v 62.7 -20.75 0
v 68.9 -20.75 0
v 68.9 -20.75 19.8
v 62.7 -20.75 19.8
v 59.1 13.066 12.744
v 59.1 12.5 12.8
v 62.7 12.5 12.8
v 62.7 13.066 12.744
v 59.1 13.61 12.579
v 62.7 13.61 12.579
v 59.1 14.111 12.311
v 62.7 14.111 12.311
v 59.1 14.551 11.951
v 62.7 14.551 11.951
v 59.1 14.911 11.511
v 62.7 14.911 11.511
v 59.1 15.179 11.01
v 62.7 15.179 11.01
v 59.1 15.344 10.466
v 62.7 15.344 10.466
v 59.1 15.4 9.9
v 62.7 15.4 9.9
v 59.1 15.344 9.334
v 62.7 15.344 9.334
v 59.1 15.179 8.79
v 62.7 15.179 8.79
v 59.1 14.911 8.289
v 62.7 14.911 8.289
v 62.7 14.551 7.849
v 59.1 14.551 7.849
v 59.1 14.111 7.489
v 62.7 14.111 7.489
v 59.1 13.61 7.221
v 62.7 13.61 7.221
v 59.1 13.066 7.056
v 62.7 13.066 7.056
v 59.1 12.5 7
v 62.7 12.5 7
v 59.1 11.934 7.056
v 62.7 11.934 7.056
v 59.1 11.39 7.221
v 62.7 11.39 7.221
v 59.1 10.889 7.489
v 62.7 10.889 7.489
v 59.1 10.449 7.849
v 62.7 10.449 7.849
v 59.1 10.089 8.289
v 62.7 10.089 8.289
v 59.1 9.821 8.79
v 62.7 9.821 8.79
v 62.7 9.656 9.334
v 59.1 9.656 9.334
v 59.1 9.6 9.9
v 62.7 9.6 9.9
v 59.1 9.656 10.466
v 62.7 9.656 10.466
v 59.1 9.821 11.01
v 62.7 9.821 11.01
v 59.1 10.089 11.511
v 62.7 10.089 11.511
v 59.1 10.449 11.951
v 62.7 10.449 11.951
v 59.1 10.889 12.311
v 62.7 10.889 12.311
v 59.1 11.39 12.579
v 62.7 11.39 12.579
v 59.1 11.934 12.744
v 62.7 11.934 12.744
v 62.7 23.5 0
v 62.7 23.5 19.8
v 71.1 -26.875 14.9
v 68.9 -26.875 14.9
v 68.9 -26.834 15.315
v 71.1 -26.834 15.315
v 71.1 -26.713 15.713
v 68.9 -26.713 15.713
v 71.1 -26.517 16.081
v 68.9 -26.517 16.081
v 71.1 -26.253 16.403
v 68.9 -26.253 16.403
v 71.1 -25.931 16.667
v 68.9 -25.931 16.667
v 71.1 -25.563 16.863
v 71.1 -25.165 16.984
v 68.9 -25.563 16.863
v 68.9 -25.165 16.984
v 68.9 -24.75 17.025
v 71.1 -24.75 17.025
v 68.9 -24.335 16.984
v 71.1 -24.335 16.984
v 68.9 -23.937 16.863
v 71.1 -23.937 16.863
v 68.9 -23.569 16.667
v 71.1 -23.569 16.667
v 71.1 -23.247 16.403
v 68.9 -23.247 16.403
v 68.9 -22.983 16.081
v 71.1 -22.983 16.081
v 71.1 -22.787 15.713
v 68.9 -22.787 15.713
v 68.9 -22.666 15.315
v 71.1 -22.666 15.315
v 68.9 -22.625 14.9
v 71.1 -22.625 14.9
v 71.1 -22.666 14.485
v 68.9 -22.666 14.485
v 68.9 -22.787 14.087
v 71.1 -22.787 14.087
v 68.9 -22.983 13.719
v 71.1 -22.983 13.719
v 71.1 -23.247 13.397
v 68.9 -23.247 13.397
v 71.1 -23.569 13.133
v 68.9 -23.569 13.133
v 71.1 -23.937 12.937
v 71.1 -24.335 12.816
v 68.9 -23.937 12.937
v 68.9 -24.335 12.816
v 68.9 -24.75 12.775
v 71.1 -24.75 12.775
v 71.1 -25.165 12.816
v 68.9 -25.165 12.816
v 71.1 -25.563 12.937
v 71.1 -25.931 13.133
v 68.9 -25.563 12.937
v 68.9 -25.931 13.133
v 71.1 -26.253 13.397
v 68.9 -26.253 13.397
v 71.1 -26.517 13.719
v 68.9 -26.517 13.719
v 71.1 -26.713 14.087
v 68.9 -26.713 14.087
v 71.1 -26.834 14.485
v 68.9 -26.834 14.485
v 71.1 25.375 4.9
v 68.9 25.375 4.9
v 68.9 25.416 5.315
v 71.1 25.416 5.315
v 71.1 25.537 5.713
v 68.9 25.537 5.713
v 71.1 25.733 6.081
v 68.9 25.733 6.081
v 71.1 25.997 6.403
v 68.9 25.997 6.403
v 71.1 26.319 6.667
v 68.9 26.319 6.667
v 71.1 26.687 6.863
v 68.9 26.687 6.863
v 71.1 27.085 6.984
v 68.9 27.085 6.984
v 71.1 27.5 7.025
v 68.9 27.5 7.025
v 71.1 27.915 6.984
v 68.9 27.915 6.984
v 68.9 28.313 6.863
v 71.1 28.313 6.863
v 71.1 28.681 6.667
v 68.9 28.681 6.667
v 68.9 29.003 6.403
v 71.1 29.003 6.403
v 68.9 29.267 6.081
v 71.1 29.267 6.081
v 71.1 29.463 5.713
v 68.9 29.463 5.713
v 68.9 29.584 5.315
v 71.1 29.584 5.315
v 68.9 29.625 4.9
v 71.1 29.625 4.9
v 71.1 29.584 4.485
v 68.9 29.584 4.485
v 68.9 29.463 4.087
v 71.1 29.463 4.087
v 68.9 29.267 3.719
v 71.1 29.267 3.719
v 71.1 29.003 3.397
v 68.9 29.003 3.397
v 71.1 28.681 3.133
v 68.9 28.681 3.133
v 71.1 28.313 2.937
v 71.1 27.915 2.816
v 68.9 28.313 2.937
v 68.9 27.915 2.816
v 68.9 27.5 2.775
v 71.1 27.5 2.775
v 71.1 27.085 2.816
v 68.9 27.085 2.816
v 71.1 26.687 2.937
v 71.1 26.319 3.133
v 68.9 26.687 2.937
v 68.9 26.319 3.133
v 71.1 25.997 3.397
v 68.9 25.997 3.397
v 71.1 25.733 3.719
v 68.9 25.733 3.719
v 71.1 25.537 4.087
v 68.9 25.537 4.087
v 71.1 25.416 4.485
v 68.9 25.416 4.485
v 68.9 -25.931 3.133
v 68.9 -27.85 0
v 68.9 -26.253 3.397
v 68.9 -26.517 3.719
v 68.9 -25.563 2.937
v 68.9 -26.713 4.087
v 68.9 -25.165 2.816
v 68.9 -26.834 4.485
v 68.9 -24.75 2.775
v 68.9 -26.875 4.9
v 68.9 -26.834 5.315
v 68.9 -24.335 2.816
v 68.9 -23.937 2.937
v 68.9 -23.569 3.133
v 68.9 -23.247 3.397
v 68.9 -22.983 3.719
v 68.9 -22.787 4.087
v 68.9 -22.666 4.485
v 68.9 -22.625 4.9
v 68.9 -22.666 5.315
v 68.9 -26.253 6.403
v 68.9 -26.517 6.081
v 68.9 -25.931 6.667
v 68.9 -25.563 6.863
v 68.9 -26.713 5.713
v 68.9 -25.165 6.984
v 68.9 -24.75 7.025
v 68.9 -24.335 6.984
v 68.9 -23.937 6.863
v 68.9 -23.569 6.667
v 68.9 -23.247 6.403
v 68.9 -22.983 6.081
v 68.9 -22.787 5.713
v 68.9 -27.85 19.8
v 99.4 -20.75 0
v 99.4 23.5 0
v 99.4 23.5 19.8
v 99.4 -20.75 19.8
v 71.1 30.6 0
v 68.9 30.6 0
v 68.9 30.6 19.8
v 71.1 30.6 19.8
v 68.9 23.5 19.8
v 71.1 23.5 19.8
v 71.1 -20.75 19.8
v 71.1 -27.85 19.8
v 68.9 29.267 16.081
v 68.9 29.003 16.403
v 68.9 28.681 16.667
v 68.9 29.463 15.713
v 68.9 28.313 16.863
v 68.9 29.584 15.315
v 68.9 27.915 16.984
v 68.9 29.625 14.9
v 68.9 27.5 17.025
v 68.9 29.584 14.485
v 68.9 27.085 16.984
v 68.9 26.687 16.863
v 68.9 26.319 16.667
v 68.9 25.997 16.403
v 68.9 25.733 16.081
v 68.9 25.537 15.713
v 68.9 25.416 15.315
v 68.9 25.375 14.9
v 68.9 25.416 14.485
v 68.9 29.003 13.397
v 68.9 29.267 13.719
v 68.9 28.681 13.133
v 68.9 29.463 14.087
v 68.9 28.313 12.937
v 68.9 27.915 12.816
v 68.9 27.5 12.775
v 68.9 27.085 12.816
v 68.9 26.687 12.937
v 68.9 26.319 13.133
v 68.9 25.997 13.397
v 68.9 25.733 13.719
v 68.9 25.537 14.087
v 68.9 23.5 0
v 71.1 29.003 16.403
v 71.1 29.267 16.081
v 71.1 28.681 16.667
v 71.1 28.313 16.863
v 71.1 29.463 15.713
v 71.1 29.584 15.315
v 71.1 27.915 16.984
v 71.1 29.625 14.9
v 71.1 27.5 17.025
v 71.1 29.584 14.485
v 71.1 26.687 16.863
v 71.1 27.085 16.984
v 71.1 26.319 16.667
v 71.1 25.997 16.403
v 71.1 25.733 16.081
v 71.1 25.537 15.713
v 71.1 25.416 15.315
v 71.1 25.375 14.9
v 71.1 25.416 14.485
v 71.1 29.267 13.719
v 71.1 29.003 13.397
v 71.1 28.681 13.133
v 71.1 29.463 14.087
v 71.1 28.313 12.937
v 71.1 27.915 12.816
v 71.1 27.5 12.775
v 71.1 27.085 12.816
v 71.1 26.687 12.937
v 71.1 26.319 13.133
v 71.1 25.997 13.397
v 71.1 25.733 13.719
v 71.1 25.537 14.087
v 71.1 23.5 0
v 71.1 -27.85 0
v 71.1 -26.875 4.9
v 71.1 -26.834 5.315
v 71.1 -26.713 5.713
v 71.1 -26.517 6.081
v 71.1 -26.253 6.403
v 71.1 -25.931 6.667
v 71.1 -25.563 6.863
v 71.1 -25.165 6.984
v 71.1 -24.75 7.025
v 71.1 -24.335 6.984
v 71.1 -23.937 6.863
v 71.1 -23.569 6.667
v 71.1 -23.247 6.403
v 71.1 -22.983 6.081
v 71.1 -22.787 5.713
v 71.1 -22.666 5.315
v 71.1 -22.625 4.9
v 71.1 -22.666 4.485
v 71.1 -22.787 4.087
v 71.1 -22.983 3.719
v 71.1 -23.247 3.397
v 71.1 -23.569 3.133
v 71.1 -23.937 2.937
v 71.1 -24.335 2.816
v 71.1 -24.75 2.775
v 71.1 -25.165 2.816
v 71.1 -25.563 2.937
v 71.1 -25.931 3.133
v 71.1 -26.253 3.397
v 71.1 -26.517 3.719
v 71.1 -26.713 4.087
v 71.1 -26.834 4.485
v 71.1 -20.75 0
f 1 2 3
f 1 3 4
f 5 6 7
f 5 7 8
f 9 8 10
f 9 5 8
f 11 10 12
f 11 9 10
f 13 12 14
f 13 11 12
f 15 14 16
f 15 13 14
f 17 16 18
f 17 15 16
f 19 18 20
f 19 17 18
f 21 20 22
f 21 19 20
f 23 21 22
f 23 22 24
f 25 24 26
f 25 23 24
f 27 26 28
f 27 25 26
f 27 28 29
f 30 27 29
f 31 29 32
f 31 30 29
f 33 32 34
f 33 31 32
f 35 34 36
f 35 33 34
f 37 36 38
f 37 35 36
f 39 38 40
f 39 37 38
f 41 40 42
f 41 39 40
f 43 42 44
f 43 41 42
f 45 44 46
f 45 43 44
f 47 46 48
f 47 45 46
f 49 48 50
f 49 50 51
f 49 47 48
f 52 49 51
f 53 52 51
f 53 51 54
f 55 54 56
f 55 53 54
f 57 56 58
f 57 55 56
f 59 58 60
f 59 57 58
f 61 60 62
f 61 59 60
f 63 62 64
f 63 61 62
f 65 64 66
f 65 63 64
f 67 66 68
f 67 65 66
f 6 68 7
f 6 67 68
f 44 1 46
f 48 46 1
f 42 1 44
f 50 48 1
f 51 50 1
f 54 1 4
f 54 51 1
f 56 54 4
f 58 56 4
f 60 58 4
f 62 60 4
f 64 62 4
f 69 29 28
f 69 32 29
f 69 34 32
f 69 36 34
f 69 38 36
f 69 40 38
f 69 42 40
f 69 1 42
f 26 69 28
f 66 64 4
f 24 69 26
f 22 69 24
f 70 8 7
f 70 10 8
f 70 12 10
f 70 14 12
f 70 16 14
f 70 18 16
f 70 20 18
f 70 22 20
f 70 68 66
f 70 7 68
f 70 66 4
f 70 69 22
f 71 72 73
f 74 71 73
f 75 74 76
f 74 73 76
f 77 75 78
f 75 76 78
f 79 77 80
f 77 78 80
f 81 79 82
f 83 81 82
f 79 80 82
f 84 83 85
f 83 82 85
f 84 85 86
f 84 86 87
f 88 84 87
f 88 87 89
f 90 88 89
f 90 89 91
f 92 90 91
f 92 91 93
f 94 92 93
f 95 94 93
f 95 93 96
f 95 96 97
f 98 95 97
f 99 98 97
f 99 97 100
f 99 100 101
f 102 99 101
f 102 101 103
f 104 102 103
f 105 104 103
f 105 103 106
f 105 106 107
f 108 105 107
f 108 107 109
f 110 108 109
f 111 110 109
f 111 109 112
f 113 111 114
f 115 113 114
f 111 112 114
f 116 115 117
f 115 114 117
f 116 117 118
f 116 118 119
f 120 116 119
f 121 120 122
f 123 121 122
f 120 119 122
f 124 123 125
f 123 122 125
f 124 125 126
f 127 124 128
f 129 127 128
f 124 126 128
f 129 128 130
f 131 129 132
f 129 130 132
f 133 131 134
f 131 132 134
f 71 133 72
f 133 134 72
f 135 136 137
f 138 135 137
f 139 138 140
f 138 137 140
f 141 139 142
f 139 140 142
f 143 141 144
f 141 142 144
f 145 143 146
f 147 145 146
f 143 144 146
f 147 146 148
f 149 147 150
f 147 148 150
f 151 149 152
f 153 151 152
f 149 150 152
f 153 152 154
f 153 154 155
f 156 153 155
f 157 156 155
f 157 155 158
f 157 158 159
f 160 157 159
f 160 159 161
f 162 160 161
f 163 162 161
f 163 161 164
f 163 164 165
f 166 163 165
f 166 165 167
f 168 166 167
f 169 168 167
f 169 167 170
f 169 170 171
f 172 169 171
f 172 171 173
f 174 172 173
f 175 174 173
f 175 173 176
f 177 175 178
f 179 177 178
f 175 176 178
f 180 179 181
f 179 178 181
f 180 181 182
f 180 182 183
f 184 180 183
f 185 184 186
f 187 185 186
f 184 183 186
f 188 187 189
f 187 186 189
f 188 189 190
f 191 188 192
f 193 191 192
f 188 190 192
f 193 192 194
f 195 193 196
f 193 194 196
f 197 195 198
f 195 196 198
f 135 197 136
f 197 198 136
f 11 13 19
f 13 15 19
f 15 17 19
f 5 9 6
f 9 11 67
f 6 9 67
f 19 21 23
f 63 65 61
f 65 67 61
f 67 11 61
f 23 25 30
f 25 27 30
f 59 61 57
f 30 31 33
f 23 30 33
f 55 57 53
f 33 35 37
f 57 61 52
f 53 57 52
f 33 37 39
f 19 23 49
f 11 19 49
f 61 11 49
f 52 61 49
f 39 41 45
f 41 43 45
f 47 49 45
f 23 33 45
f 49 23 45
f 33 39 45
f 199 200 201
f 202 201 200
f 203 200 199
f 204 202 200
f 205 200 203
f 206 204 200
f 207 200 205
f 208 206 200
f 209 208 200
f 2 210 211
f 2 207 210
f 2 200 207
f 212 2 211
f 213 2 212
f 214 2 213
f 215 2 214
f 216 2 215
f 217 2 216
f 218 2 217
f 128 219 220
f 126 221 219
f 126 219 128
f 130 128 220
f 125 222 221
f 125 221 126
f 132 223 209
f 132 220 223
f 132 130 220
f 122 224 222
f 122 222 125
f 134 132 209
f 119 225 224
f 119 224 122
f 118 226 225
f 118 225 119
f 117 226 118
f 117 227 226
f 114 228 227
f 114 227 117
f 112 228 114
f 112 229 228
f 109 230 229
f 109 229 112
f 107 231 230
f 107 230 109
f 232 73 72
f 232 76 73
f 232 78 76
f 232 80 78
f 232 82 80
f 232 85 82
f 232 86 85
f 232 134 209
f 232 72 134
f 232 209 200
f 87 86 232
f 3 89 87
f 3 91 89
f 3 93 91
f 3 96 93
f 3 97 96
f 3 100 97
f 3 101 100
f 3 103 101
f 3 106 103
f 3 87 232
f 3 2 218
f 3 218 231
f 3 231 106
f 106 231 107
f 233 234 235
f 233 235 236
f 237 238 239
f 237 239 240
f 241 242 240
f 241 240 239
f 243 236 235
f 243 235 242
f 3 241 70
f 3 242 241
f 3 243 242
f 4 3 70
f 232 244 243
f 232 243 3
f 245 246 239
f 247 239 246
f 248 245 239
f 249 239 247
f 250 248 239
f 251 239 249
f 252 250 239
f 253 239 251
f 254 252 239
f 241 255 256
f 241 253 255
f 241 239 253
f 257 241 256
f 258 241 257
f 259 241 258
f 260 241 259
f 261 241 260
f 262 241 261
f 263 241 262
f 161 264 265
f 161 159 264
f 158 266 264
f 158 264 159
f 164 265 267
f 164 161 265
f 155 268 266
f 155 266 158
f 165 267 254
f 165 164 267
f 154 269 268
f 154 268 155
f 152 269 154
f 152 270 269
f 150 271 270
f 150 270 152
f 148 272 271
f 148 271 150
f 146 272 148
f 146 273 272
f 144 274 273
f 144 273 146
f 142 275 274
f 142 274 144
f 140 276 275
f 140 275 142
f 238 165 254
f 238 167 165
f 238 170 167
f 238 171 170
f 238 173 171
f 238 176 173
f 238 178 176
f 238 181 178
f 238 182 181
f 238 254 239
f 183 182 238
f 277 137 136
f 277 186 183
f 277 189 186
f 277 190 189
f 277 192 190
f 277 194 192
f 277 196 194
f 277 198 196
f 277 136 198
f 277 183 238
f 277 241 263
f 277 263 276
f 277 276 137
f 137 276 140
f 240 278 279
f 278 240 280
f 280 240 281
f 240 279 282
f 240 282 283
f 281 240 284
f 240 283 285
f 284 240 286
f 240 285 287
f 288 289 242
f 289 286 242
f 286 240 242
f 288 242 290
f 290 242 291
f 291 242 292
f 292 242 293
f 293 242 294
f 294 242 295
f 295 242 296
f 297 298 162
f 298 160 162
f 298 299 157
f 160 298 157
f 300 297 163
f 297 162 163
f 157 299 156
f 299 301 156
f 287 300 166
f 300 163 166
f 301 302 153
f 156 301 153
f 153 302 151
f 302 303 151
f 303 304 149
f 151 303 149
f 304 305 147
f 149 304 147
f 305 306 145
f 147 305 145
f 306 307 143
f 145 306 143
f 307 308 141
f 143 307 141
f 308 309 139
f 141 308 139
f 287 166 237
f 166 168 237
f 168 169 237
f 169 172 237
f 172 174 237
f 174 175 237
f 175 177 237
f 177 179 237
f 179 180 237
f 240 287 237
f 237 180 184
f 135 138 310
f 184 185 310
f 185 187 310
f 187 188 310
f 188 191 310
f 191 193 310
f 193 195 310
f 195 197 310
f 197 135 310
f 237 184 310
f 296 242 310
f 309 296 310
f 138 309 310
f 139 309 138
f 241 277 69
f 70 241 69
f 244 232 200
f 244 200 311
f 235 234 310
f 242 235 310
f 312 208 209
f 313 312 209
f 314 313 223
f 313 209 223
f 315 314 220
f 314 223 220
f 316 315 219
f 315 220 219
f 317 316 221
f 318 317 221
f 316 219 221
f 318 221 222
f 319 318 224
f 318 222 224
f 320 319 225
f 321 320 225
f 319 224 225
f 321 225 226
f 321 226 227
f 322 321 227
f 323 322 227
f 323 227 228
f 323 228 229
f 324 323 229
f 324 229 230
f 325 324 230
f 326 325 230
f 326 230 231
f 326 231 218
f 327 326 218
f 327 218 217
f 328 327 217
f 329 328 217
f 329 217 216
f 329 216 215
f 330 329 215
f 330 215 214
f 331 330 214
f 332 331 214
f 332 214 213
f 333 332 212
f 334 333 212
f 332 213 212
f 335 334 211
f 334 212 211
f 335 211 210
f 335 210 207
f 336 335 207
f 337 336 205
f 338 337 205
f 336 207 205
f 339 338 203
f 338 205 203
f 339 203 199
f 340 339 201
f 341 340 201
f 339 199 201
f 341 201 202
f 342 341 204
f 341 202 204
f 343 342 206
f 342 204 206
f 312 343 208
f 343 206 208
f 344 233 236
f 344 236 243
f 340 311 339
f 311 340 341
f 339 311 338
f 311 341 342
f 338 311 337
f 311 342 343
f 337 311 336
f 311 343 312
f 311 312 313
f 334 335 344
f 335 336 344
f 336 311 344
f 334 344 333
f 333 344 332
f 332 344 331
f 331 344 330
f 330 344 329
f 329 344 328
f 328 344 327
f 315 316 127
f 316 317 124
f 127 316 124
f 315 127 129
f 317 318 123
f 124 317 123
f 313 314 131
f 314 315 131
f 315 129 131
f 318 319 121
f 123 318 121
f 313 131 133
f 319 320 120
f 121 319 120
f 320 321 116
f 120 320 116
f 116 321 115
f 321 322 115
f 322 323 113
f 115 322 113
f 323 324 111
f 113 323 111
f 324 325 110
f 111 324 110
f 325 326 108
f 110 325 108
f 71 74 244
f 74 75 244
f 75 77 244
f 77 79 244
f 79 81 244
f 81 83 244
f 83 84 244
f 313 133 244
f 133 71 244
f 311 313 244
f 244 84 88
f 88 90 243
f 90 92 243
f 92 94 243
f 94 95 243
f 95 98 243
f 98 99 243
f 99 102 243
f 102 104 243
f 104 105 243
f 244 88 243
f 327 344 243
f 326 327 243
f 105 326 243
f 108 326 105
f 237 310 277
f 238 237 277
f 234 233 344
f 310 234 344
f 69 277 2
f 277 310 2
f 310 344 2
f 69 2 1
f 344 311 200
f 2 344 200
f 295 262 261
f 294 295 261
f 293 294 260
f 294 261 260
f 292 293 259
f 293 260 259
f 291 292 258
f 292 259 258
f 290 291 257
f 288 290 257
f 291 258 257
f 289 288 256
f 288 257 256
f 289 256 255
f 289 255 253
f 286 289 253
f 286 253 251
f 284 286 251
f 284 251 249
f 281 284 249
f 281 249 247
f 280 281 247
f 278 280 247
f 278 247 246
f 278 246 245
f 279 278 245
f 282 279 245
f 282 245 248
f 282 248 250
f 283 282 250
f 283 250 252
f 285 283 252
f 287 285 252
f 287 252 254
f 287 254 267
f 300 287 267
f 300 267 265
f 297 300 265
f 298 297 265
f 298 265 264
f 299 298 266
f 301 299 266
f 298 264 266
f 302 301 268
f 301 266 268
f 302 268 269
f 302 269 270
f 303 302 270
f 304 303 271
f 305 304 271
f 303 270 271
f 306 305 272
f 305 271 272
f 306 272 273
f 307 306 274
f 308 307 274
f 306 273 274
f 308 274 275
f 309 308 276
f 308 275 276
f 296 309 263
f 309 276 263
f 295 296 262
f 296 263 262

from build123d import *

# Parameters (mm, degrees)
SCHIZZO1_W                   = 40.3
SCHIZZO1_H                   = 44.25
ESTRUSIONE_ESTRUSIONE1_DEPTH = 19.8
SCHIZZO2_W                   = 19.8
SCHIZZO2_H                   = 44.25
SCHIZZO2_R                   = 2.9
TAGLIO_ESTRUSIONE1_DEPTH     = 3.6
SCHIZZO3_W                   = 2.2
SCHIZZO3_H                   = 19.8
ESTRUSIONE_ESTRUSIONE2_DEPTH = 7.1
SCHIZZO4_W                   = 2.2
SCHIZZO4_H                   = 19.8
ESTRUSIONE_ESTRUSIONE3_DEPTH = 7.1
SCHIZZO5_R                   = 2.125
TAGLIO_ESTRUSIONE2_DEPTH     = 7.1


with BuildPart() as part:
    # Schizzo1 → Estrusione-Estrusione1 (new body)
    with BuildSketch(Plane(origin=(0, 0, 0), x_dir=(-1, 0, 0), z_dir=(0, 0, 1))):
        with Locations((-79.25, -1.375)):
            Rectangle(SCHIZZO1_W, SCHIZZO1_H)
    extrude(amount=ESTRUSIONE_ESTRUSIONE1_DEPTH)

    # Schizzo2 → Taglio-Estrusione1 (cut)
    with BuildSketch(Plane.ZY.offset(-59.1)):
        with Locations((9.9, 1.375)):
            Rectangle(SCHIZZO2_W, SCHIZZO2_H)
        with Locations((9.9, 12.5)):
            Circle(SCHIZZO2_R, mode=Mode.SUBTRACT)
    extrude(amount=-TAGLIO_ESTRUSIONE1_DEPTH, mode=Mode.SUBTRACT)

    # Schizzo3 → Estrusione-Estrusione2 (add)
    with BuildSketch(Plane(origin=(0, 23.5, 0), x_dir=(1, 0, 0), z_dir=(0, 1, 0))):
        with Locations((70, -9.9)):
            Rectangle(SCHIZZO3_W, SCHIZZO3_H)
    extrude(amount=ESTRUSIONE_ESTRUSIONE2_DEPTH)

    # Schizzo4 → Estrusione-Estrusione3 (add)
    with BuildSketch(Plane.XZ.offset(20.75)):
        with Locations((70, 9.9)):
            Rectangle(SCHIZZO4_W, SCHIZZO4_H)
    extrude(amount=ESTRUSIONE_ESTRUSIONE3_DEPTH)

    # Schizzo5 → Taglio-Estrusione2 (cut)
    with BuildSketch(Plane.ZY.offset(-68.9)):
        with Locations(Location((14.9, 27.5, 0), (0, 0, 270))):
            Circle(SCHIZZO5_R)
        with Locations(Location((4.9, 27.5, 0), (0, 0, 270))):
            Circle(SCHIZZO5_R)
        with Locations(Location((14.9, -24.75, 0), (0, 0, 270))):
            Circle(SCHIZZO5_R)
        with Locations(Location((4.9, -24.75, 0), (0, 0, 270))):
            Circle(SCHIZZO5_R)
    extrude(amount=-TAGLIO_ESTRUSIONE2_DEPTH, mode=Mode.SUBTRACT)


solid = part.part
